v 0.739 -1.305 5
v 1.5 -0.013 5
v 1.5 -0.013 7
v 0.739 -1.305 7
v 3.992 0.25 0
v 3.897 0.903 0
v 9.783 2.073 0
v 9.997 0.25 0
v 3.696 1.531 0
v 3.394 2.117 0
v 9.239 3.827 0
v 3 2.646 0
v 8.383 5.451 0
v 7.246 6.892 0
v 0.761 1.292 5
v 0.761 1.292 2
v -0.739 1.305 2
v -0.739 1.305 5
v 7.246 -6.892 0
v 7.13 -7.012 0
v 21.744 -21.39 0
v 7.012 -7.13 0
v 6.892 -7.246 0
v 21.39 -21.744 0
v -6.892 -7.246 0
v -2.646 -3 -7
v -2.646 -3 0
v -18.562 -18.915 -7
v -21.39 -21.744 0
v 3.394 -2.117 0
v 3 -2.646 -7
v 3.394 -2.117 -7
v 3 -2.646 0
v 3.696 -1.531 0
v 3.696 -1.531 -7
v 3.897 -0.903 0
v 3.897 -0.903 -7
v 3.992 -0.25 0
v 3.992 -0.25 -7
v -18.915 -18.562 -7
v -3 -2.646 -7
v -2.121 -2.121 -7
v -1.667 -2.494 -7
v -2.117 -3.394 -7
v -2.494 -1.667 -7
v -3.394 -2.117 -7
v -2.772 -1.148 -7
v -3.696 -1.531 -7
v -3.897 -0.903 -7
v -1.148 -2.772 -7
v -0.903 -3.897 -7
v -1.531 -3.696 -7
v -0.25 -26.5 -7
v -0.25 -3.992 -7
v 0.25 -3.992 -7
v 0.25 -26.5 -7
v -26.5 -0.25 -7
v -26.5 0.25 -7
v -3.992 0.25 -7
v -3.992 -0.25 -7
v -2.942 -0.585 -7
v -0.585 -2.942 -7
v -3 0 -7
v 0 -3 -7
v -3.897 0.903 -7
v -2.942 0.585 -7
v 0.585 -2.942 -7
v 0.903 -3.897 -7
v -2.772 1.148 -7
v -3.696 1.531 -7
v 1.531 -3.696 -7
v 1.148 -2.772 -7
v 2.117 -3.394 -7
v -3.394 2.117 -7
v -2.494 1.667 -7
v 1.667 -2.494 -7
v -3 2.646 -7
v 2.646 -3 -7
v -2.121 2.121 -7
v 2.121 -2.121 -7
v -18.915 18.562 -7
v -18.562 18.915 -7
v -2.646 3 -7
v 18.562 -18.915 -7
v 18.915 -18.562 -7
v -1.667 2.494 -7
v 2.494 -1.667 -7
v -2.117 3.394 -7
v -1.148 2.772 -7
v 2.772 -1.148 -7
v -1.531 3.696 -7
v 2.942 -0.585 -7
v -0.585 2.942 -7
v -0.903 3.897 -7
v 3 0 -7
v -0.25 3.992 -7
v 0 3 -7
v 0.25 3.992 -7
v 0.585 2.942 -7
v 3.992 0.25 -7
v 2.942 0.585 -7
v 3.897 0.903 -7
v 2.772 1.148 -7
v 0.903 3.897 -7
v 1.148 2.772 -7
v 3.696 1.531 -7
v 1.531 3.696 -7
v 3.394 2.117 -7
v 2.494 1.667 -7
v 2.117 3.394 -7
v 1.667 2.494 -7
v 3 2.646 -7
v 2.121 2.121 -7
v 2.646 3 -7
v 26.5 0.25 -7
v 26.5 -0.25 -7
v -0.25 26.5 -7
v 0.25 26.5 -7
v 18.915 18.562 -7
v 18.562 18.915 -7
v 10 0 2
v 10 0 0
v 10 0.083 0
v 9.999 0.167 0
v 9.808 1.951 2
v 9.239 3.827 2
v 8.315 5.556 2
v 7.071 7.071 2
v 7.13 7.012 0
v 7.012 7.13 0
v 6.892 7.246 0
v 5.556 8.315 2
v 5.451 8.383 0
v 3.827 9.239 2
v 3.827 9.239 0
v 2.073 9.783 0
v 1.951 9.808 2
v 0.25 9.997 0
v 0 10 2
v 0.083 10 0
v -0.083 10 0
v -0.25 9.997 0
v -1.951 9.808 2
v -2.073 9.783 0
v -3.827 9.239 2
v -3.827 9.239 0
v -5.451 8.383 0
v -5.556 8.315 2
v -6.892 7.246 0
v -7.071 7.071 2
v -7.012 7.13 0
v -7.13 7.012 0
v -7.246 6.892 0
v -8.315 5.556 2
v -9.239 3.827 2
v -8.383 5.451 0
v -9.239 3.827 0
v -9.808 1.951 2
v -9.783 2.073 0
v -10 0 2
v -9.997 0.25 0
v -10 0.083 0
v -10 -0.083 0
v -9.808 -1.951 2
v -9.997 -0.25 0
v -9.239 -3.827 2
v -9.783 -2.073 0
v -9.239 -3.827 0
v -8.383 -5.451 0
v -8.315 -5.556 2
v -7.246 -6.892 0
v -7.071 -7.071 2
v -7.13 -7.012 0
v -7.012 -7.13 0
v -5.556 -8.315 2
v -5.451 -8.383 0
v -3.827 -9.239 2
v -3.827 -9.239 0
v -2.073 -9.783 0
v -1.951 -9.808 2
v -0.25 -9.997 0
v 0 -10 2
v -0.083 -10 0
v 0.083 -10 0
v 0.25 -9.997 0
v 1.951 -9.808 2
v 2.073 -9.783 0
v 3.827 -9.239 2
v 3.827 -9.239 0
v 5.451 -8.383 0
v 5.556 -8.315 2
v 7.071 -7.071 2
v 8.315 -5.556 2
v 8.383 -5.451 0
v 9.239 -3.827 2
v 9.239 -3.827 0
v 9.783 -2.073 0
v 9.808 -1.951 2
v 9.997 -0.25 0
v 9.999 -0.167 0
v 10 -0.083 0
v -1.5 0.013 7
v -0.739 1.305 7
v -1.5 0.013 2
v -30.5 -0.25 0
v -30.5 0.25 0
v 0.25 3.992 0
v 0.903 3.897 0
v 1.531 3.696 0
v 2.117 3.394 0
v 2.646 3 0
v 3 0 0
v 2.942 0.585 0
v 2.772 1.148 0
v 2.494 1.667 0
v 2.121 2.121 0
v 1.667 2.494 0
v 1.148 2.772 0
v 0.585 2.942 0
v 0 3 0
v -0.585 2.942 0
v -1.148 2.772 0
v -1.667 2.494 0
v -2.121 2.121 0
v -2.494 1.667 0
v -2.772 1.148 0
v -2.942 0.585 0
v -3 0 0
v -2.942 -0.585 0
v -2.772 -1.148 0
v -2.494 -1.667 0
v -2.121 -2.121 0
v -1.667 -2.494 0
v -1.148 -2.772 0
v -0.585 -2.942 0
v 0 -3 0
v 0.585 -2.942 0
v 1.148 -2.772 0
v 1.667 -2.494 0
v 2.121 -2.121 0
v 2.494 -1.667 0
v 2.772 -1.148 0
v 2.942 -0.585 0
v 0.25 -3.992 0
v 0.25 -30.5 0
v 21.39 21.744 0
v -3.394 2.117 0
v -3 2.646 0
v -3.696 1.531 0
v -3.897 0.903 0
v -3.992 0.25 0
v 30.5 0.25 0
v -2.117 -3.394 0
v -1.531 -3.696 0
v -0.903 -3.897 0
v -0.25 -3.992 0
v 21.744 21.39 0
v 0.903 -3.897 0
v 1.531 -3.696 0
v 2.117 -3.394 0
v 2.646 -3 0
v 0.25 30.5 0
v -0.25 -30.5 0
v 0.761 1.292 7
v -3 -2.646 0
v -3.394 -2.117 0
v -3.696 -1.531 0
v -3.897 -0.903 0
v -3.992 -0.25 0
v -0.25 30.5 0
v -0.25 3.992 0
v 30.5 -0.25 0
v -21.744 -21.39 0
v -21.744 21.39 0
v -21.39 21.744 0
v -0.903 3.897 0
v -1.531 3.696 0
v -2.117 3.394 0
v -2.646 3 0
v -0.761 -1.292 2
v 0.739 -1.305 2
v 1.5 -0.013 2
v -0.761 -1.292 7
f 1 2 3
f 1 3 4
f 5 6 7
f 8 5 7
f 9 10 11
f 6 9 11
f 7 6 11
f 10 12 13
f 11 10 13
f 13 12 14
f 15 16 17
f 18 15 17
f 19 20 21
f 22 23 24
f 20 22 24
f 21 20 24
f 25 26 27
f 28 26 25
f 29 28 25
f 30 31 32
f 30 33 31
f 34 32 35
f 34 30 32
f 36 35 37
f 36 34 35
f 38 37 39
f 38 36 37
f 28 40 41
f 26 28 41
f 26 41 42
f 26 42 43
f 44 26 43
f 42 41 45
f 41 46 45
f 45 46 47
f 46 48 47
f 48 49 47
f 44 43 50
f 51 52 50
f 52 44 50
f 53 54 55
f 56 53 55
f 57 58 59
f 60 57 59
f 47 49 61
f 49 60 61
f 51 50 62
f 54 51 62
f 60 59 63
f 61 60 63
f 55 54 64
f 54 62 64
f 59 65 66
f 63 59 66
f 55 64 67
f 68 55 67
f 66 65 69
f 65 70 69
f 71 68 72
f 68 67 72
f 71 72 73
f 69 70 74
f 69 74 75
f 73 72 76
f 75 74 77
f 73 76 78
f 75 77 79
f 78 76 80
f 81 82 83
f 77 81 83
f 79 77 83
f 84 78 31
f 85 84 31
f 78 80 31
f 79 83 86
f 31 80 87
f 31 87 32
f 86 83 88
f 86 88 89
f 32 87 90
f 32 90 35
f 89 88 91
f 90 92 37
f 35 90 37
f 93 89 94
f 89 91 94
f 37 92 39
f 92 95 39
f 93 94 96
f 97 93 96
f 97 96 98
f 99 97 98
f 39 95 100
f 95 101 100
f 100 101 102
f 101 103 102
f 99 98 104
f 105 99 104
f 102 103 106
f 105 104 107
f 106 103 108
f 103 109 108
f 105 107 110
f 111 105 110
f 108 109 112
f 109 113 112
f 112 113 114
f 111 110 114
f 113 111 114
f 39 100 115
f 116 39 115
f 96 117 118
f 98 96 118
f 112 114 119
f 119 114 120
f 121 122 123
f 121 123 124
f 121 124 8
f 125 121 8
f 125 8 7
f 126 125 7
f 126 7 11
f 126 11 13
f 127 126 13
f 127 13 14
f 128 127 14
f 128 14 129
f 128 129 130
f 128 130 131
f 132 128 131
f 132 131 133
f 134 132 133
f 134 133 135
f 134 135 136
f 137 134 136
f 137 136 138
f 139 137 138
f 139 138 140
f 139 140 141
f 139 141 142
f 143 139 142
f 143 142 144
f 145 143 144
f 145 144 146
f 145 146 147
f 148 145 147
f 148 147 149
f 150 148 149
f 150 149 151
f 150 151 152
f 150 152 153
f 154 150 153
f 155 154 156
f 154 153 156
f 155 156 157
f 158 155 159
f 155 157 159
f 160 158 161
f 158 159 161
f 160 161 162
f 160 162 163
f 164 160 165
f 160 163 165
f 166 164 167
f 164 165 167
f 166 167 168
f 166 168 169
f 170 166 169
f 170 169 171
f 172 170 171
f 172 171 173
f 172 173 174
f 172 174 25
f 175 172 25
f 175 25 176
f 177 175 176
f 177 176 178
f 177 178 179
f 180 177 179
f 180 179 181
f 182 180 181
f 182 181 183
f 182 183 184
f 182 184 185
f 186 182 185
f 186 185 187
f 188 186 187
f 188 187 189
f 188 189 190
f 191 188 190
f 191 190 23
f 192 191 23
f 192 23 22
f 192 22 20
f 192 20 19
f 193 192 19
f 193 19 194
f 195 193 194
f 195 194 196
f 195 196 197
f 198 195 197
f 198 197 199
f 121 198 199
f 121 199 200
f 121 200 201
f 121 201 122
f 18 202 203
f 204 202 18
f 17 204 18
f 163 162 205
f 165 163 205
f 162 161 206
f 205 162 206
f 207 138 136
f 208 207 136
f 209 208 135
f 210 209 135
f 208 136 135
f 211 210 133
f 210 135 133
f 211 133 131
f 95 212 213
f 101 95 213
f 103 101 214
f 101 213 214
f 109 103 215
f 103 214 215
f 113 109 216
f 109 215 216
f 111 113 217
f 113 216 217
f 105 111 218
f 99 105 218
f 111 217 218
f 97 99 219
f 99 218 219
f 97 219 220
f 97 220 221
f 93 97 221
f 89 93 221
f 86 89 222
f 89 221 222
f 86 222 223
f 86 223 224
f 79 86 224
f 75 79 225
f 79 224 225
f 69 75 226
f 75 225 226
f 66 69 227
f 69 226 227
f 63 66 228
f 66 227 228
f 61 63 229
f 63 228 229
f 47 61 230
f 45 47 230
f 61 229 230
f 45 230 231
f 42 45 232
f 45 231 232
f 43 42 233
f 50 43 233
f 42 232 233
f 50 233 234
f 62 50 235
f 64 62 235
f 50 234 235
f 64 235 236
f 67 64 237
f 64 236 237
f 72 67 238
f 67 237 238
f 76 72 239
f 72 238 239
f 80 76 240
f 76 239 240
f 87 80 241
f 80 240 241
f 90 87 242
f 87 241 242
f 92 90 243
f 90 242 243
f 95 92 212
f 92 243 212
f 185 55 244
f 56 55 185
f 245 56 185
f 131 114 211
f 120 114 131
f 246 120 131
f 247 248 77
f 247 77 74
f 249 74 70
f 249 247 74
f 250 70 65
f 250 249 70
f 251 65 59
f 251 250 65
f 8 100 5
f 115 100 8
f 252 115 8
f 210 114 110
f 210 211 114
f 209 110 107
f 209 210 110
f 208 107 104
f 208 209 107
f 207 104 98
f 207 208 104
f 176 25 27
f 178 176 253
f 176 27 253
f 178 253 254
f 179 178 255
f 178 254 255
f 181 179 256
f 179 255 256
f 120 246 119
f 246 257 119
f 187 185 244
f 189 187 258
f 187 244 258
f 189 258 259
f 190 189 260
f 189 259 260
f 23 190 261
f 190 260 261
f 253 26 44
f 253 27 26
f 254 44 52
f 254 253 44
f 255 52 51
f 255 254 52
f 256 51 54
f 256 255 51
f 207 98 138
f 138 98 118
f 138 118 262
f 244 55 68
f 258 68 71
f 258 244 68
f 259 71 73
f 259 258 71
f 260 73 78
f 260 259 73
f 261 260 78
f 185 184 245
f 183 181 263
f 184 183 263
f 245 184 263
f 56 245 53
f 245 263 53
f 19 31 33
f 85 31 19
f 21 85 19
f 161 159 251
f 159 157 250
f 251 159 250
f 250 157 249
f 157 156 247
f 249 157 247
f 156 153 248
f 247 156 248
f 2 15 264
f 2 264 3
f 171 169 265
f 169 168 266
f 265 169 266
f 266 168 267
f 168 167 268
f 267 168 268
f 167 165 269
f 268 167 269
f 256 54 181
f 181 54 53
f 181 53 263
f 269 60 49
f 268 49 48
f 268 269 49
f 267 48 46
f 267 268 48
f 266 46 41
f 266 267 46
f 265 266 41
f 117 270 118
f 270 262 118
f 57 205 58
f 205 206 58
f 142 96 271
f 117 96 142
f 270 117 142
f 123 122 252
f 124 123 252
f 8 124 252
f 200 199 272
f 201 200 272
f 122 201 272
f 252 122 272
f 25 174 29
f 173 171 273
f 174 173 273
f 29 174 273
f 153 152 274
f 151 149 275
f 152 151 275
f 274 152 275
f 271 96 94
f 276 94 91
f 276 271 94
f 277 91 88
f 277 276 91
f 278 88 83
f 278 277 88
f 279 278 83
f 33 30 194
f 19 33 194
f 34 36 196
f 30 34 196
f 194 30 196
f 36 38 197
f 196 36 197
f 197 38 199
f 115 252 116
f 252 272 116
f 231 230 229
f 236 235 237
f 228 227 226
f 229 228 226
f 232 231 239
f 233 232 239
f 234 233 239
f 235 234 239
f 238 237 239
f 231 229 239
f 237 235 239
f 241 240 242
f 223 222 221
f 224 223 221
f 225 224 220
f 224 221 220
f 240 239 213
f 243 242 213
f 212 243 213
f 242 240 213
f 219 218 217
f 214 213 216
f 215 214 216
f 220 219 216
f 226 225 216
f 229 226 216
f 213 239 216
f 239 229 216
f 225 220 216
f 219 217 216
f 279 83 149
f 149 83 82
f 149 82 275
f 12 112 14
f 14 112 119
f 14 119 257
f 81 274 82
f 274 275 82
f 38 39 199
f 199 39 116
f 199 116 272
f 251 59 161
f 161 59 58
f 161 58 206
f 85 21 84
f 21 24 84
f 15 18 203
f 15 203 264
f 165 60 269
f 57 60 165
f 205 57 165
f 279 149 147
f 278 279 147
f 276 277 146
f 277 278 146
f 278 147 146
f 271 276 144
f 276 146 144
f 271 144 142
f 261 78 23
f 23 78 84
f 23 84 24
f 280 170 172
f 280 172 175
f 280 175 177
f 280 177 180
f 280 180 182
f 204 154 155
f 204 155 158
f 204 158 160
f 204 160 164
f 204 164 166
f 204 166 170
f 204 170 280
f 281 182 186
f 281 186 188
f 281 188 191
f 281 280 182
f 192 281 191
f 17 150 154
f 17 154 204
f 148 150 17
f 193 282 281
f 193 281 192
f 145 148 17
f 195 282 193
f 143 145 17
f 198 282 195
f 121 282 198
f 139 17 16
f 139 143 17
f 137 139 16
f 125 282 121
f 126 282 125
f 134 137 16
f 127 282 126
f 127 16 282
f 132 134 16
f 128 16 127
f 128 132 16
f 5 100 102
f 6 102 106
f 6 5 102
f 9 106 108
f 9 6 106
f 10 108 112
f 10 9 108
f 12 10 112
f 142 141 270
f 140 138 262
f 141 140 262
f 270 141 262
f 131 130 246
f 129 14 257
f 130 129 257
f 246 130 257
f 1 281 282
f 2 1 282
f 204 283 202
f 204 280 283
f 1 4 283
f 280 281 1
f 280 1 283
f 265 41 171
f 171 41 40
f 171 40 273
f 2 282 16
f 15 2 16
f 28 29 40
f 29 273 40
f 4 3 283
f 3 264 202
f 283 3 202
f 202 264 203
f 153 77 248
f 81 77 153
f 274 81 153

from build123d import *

# Parameters (mm, degrees)
BOSS_EXTRUDE1_DEPTH = 5
SKETCH2_R           = 10
BOSS_EXTRUDE2_DEPTH = 2
SKETCH4_R           = 4
SKETCH4_R_2         = 3
BOSS_EXTRUDE3_DEPTH = 7
BOSS_EXTRUDE5_DEPTH = 0.25
CIRPATTERN1_COUNT   = 8
BOSS_EXTRUDE6_DEPTH = 2


with BuildPart() as part:
    # Sketch1 → Boss-Extrude1 (new body)
    with BuildSketch(Plane.XY):
        Polygon((-0.738715324, 1.305488288), (-1.499943684, 0.012997907), (-0.76122836, -1.292490381), (0.738715324, -1.305488288), (1.499943684, -0.012997907), (0.76122836, 1.292490381), align=None)
    extrude(amount=BOSS_EXTRUDE1_DEPTH)

    # Sketch2 → Boss-Extrude2 (add)
    with BuildSketch(Plane.XY):
        Circle(SKETCH2_R)
    extrude(amount=BOSS_EXTRUDE2_DEPTH)

    # Sketch4 → Boss-Extrude3 (add)
    with BuildSketch(Plane.XY):
        Circle(SKETCH4_R)
        Circle(SKETCH4_R_2, mode=Mode.SUBTRACT)
    extrude(amount=-BOSS_EXTRUDE3_DEPTH)

    # Sketch7 → Boss-Extrude5 (add, symmetric)
    with BuildSketch(Plane(origin=(0, 0, 0), x_dir=(0, 0, -1), z_dir=(1, 0, 0))):
        Polygon((7, 3.5), (0, 3.5), (0, 30.5), (7, 26.5), align=None)
    boss_extrude5 = extrude(amount=BOSS_EXTRUDE5_DEPTH, both=True)

    # CirPattern1: Boss-Extrude5 ×8 about axis
    cirpattern1_axis = Axis((0, 0, 0), (0, 0, 1))
    for i in range(1, CIRPATTERN1_COUNT):
        add(boss_extrude5.rotate(cirpattern1_axis, i * 360 / CIRPATTERN1_COUNT))

    # Sketch9 → Boss-Extrude6 (add)
    with BuildSketch(Plane(origin=(-1.499943684, 0.012997907, 5), x_dir=(-1, 0, 0), z_dir=(0, 0, -1))):
        Polygon((-0.76122836, 1.292490381), (-2.261172044, 1.279492473), (-2.999887367, -0.025995815), (-2.238659008, -1.318486195), (-0.738715324, -1.305488288), (0, 0), align=None)
    extrude(amount=-BOSS_EXTRUDE6_DEPTH)


solid = part.part
